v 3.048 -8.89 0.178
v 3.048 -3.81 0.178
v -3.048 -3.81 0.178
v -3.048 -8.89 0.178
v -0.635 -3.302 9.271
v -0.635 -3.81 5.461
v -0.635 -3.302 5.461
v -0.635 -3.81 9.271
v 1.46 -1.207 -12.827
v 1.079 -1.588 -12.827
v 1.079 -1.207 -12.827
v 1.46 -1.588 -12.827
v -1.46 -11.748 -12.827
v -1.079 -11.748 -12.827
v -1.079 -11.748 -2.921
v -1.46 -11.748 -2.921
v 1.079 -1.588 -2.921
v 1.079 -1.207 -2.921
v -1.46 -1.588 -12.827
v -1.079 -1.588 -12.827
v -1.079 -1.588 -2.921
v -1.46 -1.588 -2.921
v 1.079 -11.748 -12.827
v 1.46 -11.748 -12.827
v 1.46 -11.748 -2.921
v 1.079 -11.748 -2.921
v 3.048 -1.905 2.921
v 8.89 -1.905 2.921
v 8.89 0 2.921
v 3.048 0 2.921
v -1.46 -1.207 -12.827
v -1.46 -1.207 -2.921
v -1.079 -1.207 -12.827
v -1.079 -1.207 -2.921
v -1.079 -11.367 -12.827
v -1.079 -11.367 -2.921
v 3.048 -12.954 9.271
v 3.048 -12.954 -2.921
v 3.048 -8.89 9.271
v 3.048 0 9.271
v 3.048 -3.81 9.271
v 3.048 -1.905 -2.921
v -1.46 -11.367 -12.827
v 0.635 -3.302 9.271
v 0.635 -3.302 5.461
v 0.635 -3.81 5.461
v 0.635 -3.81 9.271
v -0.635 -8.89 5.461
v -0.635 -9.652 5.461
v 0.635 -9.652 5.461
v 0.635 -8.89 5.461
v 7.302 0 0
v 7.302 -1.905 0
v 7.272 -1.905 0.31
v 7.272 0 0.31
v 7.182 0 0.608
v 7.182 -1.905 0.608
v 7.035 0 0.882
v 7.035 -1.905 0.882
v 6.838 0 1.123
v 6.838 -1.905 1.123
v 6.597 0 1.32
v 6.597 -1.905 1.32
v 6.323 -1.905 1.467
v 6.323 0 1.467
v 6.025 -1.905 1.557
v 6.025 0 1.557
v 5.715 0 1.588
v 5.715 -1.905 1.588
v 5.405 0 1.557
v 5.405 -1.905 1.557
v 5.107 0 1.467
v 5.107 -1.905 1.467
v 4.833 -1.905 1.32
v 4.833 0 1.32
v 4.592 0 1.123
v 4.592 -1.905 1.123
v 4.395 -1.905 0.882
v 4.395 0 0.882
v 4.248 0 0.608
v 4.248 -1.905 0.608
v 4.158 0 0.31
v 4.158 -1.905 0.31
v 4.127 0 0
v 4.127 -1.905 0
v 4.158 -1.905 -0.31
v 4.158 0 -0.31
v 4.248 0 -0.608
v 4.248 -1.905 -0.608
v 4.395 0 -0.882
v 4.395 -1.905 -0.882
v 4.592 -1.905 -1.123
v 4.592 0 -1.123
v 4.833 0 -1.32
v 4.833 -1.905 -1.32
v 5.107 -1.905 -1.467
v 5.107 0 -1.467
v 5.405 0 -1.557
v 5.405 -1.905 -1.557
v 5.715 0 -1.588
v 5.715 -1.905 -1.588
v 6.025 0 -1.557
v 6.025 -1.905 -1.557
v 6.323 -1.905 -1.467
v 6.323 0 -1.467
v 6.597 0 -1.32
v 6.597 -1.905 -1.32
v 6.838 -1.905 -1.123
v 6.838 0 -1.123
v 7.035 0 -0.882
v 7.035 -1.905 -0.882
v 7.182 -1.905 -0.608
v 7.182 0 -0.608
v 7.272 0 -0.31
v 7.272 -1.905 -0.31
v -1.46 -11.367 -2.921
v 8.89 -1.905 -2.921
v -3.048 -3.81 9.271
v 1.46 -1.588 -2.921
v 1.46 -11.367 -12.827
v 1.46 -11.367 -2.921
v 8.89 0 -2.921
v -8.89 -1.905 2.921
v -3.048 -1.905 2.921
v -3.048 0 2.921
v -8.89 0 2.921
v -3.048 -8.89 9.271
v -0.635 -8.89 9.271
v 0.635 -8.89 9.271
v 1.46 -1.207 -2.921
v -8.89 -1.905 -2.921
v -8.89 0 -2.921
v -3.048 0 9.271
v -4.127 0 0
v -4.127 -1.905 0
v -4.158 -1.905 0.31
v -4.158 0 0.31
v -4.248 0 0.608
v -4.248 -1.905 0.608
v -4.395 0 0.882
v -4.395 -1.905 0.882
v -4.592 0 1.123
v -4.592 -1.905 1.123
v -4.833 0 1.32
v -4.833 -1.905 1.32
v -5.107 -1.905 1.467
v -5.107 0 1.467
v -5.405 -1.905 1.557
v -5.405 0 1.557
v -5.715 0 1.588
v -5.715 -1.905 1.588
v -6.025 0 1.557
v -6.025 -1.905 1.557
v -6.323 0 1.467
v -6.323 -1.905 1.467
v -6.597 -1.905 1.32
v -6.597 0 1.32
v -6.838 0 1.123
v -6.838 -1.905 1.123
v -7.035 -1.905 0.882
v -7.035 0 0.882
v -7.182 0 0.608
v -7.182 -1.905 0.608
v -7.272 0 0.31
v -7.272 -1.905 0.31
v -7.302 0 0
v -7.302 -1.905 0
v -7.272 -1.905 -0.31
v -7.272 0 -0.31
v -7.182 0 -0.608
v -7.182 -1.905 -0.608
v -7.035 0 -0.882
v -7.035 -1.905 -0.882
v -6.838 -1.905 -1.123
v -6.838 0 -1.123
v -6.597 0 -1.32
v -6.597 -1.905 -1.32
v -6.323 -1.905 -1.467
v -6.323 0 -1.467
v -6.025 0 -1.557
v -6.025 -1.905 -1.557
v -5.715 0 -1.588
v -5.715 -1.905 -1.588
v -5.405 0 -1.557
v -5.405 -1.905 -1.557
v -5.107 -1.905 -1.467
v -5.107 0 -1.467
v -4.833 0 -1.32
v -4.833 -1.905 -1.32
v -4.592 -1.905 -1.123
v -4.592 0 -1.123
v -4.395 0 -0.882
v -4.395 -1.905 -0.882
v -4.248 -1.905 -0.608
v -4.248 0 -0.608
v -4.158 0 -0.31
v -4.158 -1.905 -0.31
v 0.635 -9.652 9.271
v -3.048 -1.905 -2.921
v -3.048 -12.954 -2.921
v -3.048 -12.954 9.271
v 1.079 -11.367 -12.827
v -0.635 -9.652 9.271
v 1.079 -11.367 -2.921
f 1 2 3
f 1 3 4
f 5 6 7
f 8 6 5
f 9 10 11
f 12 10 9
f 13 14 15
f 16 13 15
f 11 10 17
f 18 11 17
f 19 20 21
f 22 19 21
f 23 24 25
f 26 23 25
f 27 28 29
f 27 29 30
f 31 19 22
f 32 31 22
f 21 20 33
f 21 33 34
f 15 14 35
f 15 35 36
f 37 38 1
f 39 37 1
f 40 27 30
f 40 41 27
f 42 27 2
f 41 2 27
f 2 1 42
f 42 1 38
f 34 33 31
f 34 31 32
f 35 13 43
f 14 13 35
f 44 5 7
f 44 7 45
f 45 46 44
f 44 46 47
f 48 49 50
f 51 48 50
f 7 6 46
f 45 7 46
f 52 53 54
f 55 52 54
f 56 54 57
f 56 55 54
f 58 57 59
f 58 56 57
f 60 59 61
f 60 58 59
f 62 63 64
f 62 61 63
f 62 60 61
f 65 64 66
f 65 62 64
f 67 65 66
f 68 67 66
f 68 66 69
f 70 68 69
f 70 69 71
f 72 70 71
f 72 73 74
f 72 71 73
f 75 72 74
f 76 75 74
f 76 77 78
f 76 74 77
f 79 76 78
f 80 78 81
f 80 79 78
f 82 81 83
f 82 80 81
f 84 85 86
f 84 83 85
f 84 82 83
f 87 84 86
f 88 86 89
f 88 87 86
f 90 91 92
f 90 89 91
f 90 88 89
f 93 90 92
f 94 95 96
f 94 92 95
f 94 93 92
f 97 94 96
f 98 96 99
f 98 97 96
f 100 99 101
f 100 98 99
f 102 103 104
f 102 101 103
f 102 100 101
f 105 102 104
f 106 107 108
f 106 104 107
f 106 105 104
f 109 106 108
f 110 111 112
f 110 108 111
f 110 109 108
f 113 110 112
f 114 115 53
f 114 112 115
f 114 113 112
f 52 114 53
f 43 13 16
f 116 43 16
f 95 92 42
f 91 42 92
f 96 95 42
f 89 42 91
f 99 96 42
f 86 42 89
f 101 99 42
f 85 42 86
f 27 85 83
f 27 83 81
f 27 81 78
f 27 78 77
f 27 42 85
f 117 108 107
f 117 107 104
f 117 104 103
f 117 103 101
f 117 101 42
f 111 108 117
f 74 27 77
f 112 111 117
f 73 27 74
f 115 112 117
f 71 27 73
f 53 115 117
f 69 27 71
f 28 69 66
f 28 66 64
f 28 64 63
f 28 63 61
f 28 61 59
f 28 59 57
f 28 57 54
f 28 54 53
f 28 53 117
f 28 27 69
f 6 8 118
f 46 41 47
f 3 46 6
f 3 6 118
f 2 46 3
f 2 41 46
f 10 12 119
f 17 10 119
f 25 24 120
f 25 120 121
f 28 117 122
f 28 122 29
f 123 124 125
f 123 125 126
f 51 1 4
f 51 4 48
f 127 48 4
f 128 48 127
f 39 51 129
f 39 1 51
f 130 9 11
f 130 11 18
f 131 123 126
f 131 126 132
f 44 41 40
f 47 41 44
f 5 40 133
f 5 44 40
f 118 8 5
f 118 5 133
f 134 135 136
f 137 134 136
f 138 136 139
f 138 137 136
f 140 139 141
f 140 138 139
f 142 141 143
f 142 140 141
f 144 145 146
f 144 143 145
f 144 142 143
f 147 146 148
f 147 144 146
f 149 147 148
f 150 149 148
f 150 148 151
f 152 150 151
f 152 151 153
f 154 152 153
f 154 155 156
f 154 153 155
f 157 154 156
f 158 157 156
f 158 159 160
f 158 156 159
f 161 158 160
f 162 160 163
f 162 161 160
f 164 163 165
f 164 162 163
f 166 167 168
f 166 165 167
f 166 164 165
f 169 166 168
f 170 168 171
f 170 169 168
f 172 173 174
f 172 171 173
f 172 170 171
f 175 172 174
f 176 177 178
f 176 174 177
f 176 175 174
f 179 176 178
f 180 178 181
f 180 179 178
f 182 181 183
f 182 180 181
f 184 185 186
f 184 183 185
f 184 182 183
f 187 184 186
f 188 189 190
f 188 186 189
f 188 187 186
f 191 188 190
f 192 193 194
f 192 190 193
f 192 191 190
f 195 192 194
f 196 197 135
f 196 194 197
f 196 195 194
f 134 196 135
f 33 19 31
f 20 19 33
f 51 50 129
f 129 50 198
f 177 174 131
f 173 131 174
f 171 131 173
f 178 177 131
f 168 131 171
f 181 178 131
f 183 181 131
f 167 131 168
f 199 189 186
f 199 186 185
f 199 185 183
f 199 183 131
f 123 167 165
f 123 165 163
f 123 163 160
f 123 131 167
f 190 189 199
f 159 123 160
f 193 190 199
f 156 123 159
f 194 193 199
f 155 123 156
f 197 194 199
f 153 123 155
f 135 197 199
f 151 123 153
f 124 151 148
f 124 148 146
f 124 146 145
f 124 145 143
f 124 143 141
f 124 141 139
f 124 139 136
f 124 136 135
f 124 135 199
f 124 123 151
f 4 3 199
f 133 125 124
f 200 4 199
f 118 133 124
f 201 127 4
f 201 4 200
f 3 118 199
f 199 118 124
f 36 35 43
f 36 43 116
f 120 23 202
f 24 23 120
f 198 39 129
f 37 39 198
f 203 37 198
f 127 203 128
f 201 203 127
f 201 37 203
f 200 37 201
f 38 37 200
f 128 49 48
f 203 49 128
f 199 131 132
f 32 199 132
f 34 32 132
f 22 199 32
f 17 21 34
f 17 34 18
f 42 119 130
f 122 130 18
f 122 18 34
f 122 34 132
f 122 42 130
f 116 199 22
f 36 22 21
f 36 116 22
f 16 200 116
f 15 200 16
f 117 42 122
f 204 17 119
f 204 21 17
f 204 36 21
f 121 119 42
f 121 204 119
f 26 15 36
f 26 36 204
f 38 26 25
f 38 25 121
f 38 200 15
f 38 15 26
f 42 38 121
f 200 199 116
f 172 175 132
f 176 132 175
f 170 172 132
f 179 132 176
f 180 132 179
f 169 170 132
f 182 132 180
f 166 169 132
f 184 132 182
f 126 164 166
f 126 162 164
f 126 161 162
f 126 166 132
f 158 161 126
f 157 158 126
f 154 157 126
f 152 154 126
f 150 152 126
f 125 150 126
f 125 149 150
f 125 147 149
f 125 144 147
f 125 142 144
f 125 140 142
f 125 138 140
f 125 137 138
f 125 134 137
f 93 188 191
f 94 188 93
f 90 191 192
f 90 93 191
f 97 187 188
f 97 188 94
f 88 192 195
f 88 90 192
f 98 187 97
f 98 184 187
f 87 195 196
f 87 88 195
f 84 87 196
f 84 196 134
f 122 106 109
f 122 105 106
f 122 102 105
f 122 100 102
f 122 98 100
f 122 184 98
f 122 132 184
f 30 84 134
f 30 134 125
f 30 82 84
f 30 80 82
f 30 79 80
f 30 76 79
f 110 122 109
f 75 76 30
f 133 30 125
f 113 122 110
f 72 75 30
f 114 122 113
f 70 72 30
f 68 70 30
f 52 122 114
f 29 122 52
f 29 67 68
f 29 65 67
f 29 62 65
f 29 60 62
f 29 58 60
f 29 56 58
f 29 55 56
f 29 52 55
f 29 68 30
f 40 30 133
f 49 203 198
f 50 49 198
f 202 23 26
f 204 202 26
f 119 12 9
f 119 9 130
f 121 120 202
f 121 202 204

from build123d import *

# Parameters (mm, degrees)
F0_R     = 1.5875
F0_W     = 0.381
F0_H     = 9.906
F1_DEPTH = 127
F2_W     = 0.381
F2_H     = 9.906
F3_DEPTH = 127
F7_DEPTH = 127
F5_W     = 1.27
F5_H     = 3.81
F8_DEPTH = 3.175


with BuildPart() as f1:
    # F0 (on Front) → F1 (new body, symmetric)
    with BuildSketch(Plane.XZ):
        Polygon((-8.89, 2.921), (-8.89, -2.921), (-1.4605, -2.921), (-1.0795, -2.921), (1.0795, -2.921), (1.4605, -2.921), (8.89, -2.921), (8.89, 2.921), (3.048, 2.921), (3.048, 9.271), (-3.048, 9.271), (-3.048, 2.921), align=None)
        with Locations((-5.715, 0)):
            Circle(F0_R, mode=Mode.SUBTRACT)
        with Locations((5.715, 0)):
            Circle(F0_R, mode=Mode.SUBTRACT)
        with Locations((-1.27, -7.874)):
            Rectangle(F0_W, F0_H)
        with Locations((1.27, -7.874)):
            Rectangle(F0_W, F0_H)
    extrude(amount=F1_DEPTH, both=True)

    # F2 (on Right) → F3 (intersect, symmetric)
    with BuildSketch(Plane.YZ):
        Polygon((-8.89, 9.271), (-12.954, 9.271), (-12.954, -2.921), (-11.7475, -2.921), (-11.3665, -2.921), (-1.5875, -2.921), (-1.2065, -2.921), (0, -2.921), (0, 9.271), (-3.81, 9.271), (-3.81, 0.1778), (-8.89, 0.1778), align=None)
        with Locations((-1.397, -7.874)):
            Rectangle(F2_W, F2_H)
        with Locations((-11.557, -7.874)):
            Rectangle(F2_W, F2_H)
    extrude(amount=F3_DEPTH, both=True, mode=Mode.INTERSECT)

    # F6 (on Top) → F7 (intersect, symmetric)
    with BuildSketch(Plane.XY):
        Polygon((8.89, 0), (-8.89, 0), (-8.89, -1.905), (-3.048, -1.905), (-3.048, -12.954), (3.048, -12.954), (3.048, -1.905), (8.89, -1.905), align=None)
    extrude(amount=F7_DEPTH, both=True, mode=Mode.INTERSECT)

    # F5 (on plane+point) → F8 (cut, symmetric)
    with BuildSketch(Plane.XZ.offset(6.477)):
        with Locations((0, 7.366)):
            Rectangle(F5_W, F5_H)
    extrude(amount=F8_DEPTH, both=True, mode=Mode.SUBTRACT)


solid = f1.part
